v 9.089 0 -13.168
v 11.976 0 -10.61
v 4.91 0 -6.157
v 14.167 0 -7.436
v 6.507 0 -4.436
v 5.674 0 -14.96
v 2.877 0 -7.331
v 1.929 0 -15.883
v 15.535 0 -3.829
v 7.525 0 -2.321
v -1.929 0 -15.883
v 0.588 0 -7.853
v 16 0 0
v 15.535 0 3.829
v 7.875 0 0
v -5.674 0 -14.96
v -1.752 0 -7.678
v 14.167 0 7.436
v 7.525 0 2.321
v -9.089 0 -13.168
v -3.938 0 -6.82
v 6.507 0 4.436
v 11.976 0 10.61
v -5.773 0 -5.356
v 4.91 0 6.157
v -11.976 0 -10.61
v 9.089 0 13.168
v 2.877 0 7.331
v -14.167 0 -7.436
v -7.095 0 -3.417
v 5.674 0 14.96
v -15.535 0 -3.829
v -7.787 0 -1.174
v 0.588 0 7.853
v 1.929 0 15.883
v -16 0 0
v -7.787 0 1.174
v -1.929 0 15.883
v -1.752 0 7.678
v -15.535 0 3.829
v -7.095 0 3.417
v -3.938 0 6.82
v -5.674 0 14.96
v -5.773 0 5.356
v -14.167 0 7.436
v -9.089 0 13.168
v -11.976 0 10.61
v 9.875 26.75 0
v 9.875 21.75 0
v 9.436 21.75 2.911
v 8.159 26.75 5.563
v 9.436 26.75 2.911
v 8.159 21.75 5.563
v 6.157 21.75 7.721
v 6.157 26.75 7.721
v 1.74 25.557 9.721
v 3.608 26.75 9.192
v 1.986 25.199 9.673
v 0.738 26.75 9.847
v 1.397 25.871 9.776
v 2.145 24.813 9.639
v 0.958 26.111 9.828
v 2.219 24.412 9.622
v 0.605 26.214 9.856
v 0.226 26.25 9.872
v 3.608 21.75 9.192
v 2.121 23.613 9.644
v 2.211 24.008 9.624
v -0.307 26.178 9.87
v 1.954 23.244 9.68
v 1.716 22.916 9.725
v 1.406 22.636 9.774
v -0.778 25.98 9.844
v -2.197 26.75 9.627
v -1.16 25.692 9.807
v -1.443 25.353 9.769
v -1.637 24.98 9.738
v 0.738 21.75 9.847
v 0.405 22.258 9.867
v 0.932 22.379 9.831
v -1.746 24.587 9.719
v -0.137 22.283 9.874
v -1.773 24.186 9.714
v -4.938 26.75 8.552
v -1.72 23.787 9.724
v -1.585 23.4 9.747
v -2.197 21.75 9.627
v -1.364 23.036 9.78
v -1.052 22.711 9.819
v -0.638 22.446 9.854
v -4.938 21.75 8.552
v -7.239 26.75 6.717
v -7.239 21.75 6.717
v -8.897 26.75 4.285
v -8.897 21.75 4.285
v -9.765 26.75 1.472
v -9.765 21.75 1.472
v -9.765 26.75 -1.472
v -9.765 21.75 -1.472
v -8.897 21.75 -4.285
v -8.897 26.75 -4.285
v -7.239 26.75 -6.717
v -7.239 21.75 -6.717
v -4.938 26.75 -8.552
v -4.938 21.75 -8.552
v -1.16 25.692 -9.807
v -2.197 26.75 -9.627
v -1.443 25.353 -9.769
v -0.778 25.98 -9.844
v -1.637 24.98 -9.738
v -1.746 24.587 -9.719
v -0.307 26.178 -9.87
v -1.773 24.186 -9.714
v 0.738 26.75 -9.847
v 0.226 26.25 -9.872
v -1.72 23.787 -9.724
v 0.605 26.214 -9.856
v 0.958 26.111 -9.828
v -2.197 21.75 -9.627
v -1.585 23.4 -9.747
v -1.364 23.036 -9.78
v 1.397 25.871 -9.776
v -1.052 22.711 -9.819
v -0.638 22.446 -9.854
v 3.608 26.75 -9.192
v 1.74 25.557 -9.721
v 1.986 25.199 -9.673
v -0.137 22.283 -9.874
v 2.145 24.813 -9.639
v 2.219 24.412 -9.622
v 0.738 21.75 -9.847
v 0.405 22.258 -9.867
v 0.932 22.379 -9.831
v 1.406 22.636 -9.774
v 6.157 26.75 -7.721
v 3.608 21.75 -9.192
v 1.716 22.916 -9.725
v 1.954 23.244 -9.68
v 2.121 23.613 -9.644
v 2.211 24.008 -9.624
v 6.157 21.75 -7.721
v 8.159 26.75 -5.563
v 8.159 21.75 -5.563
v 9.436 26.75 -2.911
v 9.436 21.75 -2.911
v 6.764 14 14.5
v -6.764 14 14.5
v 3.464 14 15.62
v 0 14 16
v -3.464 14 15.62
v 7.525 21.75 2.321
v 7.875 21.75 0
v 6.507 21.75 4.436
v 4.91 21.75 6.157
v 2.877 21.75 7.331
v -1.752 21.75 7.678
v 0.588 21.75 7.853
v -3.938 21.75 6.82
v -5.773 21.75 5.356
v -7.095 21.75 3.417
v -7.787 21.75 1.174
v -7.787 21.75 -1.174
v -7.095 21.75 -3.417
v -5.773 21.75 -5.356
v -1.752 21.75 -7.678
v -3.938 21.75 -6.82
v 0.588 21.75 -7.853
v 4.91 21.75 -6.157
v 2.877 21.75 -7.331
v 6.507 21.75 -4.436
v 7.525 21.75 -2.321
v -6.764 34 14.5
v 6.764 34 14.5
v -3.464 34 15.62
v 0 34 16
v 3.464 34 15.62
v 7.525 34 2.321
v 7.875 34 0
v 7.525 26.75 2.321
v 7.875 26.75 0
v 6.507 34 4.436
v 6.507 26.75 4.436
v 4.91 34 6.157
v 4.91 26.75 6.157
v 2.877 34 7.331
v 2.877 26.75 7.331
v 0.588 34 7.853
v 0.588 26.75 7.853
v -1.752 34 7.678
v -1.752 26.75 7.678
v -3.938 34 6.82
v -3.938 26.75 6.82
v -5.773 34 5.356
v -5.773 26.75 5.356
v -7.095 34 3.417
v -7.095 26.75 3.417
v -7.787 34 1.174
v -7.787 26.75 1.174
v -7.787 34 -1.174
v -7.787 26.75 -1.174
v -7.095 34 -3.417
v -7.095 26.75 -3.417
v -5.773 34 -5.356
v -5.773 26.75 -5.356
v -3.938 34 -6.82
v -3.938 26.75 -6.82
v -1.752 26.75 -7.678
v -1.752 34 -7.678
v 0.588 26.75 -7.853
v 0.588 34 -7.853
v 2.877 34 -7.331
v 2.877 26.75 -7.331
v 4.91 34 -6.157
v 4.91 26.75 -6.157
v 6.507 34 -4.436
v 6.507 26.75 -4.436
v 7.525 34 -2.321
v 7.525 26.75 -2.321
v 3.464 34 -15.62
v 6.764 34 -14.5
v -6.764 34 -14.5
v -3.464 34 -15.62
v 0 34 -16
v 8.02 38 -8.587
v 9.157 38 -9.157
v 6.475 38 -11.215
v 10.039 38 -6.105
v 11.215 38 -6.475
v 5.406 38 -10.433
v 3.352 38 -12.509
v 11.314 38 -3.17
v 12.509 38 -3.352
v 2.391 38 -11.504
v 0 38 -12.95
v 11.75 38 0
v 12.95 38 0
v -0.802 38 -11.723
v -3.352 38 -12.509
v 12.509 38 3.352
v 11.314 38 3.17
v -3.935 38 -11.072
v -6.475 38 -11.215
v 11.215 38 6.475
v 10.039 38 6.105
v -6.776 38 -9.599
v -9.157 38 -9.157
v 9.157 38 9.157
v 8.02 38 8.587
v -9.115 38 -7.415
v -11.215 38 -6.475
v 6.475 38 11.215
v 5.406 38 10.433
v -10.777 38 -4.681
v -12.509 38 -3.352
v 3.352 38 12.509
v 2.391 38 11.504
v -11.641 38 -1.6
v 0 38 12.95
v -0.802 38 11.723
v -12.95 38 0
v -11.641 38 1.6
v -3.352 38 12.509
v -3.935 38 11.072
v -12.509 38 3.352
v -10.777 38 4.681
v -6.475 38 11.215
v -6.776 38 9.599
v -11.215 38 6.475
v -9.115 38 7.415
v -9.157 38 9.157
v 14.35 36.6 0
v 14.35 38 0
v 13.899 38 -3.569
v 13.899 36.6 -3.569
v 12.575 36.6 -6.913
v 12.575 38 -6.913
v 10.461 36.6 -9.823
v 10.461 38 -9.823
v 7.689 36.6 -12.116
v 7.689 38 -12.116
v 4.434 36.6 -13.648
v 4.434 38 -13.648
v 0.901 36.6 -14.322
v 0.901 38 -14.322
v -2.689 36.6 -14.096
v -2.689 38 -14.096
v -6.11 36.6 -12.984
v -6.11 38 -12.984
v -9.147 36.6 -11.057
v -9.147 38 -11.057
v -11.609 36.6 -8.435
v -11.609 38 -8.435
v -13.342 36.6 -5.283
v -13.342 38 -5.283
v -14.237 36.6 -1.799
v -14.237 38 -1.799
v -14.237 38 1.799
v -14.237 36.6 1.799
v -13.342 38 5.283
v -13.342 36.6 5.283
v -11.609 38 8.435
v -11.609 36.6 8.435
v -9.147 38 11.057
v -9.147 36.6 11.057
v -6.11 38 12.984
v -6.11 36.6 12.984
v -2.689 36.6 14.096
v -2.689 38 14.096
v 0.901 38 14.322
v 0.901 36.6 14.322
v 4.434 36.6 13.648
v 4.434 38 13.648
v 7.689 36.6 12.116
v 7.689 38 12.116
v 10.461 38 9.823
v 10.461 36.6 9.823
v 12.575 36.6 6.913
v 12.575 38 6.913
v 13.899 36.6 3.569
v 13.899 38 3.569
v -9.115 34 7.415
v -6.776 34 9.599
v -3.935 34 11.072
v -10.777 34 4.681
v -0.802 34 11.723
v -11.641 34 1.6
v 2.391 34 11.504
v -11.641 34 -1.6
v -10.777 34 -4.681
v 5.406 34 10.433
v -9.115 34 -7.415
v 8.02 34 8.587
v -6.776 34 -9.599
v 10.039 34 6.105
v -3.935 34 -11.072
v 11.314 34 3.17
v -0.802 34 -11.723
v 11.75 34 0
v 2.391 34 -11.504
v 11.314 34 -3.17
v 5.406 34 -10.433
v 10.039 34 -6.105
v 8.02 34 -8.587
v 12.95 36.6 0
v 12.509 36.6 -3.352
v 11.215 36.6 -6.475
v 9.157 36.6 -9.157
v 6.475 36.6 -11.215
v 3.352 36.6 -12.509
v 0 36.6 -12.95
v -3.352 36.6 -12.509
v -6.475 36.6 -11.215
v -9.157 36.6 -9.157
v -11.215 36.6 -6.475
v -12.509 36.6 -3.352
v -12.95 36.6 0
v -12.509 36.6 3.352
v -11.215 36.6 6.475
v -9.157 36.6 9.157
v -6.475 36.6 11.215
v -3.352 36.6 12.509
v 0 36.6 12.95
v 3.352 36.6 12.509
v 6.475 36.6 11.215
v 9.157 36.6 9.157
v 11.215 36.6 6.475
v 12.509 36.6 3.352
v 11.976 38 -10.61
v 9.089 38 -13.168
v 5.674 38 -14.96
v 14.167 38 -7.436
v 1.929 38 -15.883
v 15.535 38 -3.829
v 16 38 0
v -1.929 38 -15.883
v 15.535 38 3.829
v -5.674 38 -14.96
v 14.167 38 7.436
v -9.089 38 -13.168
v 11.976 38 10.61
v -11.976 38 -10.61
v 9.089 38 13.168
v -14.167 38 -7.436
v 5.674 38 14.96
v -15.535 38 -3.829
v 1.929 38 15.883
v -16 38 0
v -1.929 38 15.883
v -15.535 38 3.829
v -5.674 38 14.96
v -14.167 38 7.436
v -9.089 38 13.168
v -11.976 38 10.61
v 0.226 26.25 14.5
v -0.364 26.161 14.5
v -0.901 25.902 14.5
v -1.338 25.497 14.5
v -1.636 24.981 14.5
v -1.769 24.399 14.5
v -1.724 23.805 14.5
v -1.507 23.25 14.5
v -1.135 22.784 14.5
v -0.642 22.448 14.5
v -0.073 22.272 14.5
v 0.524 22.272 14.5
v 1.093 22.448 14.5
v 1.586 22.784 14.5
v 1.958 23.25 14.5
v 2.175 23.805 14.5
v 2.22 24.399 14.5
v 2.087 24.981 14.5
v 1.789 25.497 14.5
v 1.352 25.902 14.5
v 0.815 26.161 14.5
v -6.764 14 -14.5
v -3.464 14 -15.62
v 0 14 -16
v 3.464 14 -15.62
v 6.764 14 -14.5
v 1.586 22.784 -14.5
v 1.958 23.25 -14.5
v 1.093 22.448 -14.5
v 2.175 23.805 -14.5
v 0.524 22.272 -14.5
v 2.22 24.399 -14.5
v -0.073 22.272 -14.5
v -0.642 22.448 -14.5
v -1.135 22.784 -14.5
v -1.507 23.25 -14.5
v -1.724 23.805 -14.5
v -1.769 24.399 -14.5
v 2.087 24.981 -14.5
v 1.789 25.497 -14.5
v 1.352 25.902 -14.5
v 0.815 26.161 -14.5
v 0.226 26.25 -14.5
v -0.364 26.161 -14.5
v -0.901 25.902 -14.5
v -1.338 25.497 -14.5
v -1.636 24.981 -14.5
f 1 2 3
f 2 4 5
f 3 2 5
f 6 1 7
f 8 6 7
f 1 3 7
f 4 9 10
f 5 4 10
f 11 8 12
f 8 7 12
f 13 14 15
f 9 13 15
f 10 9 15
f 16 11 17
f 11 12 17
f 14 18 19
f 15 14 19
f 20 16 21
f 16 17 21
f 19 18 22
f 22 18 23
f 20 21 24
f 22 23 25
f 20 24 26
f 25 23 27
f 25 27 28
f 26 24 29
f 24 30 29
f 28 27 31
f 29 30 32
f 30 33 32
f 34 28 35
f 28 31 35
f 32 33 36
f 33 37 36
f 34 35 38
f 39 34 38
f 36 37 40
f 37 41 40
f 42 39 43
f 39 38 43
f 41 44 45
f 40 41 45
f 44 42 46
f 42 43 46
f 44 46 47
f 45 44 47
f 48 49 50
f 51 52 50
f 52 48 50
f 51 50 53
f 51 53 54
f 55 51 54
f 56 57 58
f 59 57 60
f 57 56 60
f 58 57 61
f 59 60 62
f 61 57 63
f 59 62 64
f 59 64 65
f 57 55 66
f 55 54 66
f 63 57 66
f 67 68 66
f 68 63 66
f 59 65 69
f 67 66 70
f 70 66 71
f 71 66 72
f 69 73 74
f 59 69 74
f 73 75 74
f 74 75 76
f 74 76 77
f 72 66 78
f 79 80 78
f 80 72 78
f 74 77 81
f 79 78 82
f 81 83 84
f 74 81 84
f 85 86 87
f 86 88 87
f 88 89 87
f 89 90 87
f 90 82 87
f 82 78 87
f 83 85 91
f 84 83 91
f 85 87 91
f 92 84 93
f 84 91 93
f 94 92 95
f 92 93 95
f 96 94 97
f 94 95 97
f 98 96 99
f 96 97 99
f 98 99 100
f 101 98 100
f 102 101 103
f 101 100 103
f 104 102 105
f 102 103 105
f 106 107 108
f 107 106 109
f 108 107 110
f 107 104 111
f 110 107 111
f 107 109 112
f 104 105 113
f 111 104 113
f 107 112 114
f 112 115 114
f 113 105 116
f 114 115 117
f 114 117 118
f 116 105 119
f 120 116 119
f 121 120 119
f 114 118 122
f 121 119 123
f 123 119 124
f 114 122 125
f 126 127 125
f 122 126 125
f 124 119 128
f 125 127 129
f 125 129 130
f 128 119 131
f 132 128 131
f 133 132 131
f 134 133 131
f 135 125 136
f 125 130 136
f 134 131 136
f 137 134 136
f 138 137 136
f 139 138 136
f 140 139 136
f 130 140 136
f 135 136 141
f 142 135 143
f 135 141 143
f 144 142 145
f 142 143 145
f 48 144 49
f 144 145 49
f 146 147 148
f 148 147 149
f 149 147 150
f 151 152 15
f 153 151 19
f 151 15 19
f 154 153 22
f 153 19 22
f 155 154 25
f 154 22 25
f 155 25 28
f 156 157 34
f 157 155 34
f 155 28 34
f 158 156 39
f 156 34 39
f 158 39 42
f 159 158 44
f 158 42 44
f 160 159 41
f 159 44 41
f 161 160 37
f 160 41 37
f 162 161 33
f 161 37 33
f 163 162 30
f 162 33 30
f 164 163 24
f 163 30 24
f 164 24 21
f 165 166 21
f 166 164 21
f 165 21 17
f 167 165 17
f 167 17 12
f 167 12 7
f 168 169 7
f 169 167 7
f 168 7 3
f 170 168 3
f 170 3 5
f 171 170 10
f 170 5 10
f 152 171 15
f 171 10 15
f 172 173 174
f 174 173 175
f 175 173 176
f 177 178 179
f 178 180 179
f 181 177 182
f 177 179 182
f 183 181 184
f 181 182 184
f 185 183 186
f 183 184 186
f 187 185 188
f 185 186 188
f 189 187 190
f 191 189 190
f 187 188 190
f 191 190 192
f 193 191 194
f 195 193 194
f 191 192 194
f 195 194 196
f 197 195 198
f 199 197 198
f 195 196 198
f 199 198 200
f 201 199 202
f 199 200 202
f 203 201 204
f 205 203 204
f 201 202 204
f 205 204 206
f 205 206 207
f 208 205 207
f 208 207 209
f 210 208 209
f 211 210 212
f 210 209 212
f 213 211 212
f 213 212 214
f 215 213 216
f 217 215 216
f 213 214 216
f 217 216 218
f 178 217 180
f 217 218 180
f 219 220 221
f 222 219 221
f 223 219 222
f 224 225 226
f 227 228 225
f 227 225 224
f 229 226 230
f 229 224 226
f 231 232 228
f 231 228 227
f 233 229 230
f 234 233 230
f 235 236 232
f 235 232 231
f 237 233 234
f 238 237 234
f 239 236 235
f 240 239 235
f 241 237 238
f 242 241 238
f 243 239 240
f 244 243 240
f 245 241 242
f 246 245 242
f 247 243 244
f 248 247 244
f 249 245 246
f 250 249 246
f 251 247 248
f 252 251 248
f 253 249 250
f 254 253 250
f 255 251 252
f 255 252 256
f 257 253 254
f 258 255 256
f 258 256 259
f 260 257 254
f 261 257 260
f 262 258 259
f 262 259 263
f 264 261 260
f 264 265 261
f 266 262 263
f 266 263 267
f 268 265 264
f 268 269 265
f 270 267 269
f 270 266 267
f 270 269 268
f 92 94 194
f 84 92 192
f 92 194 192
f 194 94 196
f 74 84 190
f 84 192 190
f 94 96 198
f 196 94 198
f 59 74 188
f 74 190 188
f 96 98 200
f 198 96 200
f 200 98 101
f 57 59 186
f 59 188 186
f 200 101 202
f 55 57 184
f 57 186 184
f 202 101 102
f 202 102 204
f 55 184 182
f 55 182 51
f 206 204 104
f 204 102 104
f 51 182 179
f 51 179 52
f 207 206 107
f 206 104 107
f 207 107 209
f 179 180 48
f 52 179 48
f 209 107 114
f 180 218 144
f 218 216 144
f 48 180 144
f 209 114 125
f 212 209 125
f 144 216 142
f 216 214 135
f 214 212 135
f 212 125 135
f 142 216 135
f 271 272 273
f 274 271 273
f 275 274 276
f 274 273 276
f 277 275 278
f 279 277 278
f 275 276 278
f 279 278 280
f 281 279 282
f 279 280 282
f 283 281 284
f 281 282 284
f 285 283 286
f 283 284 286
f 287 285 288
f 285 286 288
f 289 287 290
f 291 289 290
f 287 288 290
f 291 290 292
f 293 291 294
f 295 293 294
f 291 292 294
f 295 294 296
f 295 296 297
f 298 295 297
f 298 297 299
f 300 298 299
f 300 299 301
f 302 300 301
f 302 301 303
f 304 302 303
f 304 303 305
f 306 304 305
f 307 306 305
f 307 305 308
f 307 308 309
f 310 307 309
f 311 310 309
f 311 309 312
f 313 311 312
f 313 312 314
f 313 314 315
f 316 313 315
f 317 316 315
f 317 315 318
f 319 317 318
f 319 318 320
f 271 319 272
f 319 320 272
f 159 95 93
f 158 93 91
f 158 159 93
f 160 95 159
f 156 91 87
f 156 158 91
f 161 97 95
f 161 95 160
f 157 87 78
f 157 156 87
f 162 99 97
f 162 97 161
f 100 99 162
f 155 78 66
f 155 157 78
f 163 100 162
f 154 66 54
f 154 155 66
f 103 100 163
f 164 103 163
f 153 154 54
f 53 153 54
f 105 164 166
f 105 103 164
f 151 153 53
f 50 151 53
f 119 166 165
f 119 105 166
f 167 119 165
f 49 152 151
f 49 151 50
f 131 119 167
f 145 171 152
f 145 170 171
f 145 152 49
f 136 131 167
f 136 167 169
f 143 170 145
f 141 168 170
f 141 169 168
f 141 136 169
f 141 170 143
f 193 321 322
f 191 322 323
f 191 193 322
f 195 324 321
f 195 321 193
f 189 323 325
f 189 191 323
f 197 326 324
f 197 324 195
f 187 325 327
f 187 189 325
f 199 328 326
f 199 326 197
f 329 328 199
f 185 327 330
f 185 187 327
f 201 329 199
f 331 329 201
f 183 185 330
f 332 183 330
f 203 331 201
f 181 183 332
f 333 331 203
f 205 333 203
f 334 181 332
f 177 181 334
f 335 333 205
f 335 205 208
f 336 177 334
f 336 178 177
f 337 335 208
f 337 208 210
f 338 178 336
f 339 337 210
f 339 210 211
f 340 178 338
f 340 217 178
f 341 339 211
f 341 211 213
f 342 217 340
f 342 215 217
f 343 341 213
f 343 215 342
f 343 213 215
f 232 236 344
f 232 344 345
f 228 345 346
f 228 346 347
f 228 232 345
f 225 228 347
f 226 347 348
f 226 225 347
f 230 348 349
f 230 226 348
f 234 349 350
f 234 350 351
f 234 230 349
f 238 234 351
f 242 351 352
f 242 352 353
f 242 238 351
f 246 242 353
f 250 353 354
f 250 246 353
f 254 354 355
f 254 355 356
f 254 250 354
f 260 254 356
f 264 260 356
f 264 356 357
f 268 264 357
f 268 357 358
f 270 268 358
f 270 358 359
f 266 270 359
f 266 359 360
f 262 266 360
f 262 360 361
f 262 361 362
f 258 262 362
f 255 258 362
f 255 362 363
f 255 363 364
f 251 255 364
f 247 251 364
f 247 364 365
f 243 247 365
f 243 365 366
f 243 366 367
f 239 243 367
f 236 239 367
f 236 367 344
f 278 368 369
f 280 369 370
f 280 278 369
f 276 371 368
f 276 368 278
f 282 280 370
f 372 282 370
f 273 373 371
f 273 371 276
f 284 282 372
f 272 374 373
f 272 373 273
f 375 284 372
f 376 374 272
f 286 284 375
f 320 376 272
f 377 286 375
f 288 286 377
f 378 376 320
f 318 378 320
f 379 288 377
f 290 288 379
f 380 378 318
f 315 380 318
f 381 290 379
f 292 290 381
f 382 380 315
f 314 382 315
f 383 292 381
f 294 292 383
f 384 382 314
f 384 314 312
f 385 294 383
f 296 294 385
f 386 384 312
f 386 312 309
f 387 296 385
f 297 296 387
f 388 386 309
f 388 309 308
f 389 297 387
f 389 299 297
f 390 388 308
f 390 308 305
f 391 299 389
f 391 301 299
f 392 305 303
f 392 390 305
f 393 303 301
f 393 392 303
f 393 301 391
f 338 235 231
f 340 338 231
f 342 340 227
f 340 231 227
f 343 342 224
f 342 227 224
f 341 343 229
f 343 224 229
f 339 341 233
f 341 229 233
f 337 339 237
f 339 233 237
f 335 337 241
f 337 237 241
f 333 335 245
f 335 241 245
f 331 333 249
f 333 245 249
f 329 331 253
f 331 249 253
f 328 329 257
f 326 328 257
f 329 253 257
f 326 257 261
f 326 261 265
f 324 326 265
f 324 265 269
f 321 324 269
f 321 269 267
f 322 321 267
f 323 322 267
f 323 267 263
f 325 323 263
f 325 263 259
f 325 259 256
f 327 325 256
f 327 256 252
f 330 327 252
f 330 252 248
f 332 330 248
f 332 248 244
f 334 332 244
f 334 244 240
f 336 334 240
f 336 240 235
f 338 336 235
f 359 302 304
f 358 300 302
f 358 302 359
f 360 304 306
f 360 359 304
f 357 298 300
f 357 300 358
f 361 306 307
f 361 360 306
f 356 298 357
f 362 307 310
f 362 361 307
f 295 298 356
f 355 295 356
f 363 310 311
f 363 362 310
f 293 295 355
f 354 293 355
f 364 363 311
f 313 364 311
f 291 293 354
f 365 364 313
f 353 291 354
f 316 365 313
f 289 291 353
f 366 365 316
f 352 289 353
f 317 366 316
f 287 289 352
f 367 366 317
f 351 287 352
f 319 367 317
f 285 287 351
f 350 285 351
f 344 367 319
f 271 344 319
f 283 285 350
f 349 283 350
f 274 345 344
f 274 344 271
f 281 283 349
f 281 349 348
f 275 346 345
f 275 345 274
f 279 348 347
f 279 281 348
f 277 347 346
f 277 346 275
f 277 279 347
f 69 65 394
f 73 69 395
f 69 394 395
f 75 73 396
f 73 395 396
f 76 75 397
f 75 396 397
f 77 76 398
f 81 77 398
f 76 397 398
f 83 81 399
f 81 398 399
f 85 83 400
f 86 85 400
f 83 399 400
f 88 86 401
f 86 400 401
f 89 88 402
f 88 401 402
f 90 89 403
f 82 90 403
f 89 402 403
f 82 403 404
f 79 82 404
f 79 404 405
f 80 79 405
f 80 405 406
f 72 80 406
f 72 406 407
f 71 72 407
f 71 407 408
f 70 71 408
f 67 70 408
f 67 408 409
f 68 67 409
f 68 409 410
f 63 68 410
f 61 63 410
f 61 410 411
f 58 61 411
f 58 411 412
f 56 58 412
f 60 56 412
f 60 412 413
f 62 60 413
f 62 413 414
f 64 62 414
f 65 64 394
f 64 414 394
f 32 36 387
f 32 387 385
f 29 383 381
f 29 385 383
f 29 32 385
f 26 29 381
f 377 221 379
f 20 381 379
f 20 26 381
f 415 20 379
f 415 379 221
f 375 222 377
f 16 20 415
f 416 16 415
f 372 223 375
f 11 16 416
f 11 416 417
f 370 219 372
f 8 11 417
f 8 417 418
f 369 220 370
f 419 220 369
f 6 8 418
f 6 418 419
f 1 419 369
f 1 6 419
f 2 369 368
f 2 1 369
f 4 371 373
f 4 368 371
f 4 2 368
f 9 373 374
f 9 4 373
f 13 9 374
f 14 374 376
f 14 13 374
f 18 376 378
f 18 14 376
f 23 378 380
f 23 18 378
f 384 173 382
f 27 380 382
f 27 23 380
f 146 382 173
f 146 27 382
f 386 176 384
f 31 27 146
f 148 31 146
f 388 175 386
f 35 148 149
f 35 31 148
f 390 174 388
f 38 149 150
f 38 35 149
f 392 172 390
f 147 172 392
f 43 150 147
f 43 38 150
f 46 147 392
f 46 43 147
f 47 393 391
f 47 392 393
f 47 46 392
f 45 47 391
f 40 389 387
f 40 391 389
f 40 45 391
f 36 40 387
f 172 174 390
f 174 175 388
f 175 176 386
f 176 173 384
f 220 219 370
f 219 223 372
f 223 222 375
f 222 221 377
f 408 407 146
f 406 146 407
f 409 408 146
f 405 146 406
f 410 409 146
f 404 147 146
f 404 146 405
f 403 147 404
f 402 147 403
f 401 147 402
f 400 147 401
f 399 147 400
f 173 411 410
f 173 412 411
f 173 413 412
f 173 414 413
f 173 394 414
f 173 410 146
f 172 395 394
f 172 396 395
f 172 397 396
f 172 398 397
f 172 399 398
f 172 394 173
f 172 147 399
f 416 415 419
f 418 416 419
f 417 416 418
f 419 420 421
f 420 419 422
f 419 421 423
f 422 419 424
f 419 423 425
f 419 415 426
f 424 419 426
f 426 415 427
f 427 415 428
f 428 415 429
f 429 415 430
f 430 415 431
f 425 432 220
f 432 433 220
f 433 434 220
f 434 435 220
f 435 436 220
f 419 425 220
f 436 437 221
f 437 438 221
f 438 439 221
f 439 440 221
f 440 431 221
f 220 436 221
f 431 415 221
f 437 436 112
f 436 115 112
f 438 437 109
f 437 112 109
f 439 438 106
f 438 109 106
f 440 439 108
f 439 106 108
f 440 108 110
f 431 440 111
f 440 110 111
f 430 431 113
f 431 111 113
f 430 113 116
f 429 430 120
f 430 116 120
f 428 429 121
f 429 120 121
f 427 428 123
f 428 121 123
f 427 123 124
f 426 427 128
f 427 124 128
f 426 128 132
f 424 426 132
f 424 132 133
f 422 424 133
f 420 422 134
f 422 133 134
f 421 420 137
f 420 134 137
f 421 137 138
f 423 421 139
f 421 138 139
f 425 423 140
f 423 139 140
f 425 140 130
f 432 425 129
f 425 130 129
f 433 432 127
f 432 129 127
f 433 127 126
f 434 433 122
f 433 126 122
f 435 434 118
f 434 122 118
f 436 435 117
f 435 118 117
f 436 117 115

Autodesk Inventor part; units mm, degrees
ref_plane "YZ Plane" through (0, 0, 0) normal (1, 0, 0) x (0, 1, 0)
ref_plane "XZ Plane" through (0, 0, 0) normal (0, 1, 0) x (-1, 0, 0)
ref_plane "XY Plane" through (0, 0, 0) normal (0, 0, 1) x (1, 0, 0)
sketch "Sketch1" plane through (0, 0, 0) normal (0, 1, 0) x (-1, 0, 0)
  circle A0 centre (0, 0) radius 16
  dimension "d0" = 32
extrude "Extrusion1" add sketch "Sketch1" along normal blind 38
thread "Thread1" size "M32x1.5" class "6g" standard "ANSI Metric M Profile" length 12
sketch "Sketch2" plane through (0, 0, 0) normal (0, -1, 0) x (1, 0, 0)
  circle A0 centre (0, 0) radius 7.875
  dimension "d5" = 15.75
extrude "Extrusion2" cut sketch "Sketch2" against normal through all
sketch "Sketch3" plane through (0, 38, 0) normal (0, 1, 0) x (1, 0, 0)
  circle A0 centre (0, 0) radius 11.75
  dimension "d8" = 23.5
extrude "Extrusion3" cut sketch "Sketch3" against normal blind 4
sketch "Sketch4" plane through (0, 0, 0) normal (1, 0, 0) x (0, 1, 0)
  line L0 (0, 16) -> (38, 16) projected
  line L1 (34, 16) -> (14, 16)
  line L2 (14, 16) -> (14, 14.5)
  line L3 (14, 14.5) -> (34, 14.5)
  line L4 (34, 14.5) -> (34, 16)
  line L5 (0, -16) -> (38, -16) projected
  line L6 (34, -16) -> (14, -16)
  line L7 (14, -16) -> (14, -14.5)
  line L8 (14, -14.5) -> (34, -14.5)
  line L9 (34, -14.5) -> (34, -16)
  line L10 (38, -16) -> (38, 16) projected
  point P0 (0, 0)
  point P1 (14, 16)
  point P2 (14, -16)
  dimension "d11" = 20
  dimension "d12" = 1.5
  dimension "d13" = 1.5
  dimension "d33" = 4
extrude "Extrusion4" cut sketch "Sketch4" along normal through all both and the other way through all
sketch "Sketch5" plane through (0, 0, 0) normal (0, 0, 1) x (1, 0, 0)
  line L0 (7.875, 0) -> (7.875, 34) projected
  line L1 (7.875, 26.75) -> (9.875, 26.75)
  line L2 (9.875, 26.75) -> (9.875, 21.75)
  line L3 (9.875, 21.75) -> (7.875, 21.75)
  line L4 (7.875, 21.75) -> (7.875, 26.75)
  line L5 (0, -5.7834) -> (0, 45.928)
  line L6 (-11.75, 38) -> (11.75, 38) projected
  point P0 (0, 0)
  point P1 (7.875, 21.75)
  dimension "d17" = 11.25
  dimension "d18" = 16.25
  dimension "d19" = 2
revolve "Revolution1" cut sketch "Sketch5" angle 360 about axis through (0, -5.7834, 0) along (0, 1, 0)
sketch "Sketch6" plane through (6.7639, 34, -14.5) normal (0, 0, -1) x (-1, 0, 0)
  line L0 (-3.1111, -7.25) -> (16.6389, -7.25) projected
  line L1 (-3.1111, -12.25) -> (16.6389, -12.25) projected
  point P0 (6.7639, -34)
  point P1 (6.5383, -9.75)
  dimension "d20" = 5
  dimension "d21" = 2.5
hole "Hole1" at (0.2255, 24.25, -14.5) direction (0, 0, 1) diameter 4 end through all
sketch "Sketch7" plane through (0, 38, 0) normal (0, 1, 0) x (1, 0, 0)
  circle A0 centre (0, 0) radius 12.95
  circle A1 centre (0, 0) radius 14.35
  circle A2 centre (0, 0) radius 11.75 projected
  dimension "d29" = 1.2
  dimension "d30" = 1.4
extrude "Extrusion5" cut sketch "Sketch7" against normal blind 1.4 contours A1
equation "\"d21\" = 0.5 * d20"
properties part number "Passthrough Base Insert" material "Aluminum 6061"
